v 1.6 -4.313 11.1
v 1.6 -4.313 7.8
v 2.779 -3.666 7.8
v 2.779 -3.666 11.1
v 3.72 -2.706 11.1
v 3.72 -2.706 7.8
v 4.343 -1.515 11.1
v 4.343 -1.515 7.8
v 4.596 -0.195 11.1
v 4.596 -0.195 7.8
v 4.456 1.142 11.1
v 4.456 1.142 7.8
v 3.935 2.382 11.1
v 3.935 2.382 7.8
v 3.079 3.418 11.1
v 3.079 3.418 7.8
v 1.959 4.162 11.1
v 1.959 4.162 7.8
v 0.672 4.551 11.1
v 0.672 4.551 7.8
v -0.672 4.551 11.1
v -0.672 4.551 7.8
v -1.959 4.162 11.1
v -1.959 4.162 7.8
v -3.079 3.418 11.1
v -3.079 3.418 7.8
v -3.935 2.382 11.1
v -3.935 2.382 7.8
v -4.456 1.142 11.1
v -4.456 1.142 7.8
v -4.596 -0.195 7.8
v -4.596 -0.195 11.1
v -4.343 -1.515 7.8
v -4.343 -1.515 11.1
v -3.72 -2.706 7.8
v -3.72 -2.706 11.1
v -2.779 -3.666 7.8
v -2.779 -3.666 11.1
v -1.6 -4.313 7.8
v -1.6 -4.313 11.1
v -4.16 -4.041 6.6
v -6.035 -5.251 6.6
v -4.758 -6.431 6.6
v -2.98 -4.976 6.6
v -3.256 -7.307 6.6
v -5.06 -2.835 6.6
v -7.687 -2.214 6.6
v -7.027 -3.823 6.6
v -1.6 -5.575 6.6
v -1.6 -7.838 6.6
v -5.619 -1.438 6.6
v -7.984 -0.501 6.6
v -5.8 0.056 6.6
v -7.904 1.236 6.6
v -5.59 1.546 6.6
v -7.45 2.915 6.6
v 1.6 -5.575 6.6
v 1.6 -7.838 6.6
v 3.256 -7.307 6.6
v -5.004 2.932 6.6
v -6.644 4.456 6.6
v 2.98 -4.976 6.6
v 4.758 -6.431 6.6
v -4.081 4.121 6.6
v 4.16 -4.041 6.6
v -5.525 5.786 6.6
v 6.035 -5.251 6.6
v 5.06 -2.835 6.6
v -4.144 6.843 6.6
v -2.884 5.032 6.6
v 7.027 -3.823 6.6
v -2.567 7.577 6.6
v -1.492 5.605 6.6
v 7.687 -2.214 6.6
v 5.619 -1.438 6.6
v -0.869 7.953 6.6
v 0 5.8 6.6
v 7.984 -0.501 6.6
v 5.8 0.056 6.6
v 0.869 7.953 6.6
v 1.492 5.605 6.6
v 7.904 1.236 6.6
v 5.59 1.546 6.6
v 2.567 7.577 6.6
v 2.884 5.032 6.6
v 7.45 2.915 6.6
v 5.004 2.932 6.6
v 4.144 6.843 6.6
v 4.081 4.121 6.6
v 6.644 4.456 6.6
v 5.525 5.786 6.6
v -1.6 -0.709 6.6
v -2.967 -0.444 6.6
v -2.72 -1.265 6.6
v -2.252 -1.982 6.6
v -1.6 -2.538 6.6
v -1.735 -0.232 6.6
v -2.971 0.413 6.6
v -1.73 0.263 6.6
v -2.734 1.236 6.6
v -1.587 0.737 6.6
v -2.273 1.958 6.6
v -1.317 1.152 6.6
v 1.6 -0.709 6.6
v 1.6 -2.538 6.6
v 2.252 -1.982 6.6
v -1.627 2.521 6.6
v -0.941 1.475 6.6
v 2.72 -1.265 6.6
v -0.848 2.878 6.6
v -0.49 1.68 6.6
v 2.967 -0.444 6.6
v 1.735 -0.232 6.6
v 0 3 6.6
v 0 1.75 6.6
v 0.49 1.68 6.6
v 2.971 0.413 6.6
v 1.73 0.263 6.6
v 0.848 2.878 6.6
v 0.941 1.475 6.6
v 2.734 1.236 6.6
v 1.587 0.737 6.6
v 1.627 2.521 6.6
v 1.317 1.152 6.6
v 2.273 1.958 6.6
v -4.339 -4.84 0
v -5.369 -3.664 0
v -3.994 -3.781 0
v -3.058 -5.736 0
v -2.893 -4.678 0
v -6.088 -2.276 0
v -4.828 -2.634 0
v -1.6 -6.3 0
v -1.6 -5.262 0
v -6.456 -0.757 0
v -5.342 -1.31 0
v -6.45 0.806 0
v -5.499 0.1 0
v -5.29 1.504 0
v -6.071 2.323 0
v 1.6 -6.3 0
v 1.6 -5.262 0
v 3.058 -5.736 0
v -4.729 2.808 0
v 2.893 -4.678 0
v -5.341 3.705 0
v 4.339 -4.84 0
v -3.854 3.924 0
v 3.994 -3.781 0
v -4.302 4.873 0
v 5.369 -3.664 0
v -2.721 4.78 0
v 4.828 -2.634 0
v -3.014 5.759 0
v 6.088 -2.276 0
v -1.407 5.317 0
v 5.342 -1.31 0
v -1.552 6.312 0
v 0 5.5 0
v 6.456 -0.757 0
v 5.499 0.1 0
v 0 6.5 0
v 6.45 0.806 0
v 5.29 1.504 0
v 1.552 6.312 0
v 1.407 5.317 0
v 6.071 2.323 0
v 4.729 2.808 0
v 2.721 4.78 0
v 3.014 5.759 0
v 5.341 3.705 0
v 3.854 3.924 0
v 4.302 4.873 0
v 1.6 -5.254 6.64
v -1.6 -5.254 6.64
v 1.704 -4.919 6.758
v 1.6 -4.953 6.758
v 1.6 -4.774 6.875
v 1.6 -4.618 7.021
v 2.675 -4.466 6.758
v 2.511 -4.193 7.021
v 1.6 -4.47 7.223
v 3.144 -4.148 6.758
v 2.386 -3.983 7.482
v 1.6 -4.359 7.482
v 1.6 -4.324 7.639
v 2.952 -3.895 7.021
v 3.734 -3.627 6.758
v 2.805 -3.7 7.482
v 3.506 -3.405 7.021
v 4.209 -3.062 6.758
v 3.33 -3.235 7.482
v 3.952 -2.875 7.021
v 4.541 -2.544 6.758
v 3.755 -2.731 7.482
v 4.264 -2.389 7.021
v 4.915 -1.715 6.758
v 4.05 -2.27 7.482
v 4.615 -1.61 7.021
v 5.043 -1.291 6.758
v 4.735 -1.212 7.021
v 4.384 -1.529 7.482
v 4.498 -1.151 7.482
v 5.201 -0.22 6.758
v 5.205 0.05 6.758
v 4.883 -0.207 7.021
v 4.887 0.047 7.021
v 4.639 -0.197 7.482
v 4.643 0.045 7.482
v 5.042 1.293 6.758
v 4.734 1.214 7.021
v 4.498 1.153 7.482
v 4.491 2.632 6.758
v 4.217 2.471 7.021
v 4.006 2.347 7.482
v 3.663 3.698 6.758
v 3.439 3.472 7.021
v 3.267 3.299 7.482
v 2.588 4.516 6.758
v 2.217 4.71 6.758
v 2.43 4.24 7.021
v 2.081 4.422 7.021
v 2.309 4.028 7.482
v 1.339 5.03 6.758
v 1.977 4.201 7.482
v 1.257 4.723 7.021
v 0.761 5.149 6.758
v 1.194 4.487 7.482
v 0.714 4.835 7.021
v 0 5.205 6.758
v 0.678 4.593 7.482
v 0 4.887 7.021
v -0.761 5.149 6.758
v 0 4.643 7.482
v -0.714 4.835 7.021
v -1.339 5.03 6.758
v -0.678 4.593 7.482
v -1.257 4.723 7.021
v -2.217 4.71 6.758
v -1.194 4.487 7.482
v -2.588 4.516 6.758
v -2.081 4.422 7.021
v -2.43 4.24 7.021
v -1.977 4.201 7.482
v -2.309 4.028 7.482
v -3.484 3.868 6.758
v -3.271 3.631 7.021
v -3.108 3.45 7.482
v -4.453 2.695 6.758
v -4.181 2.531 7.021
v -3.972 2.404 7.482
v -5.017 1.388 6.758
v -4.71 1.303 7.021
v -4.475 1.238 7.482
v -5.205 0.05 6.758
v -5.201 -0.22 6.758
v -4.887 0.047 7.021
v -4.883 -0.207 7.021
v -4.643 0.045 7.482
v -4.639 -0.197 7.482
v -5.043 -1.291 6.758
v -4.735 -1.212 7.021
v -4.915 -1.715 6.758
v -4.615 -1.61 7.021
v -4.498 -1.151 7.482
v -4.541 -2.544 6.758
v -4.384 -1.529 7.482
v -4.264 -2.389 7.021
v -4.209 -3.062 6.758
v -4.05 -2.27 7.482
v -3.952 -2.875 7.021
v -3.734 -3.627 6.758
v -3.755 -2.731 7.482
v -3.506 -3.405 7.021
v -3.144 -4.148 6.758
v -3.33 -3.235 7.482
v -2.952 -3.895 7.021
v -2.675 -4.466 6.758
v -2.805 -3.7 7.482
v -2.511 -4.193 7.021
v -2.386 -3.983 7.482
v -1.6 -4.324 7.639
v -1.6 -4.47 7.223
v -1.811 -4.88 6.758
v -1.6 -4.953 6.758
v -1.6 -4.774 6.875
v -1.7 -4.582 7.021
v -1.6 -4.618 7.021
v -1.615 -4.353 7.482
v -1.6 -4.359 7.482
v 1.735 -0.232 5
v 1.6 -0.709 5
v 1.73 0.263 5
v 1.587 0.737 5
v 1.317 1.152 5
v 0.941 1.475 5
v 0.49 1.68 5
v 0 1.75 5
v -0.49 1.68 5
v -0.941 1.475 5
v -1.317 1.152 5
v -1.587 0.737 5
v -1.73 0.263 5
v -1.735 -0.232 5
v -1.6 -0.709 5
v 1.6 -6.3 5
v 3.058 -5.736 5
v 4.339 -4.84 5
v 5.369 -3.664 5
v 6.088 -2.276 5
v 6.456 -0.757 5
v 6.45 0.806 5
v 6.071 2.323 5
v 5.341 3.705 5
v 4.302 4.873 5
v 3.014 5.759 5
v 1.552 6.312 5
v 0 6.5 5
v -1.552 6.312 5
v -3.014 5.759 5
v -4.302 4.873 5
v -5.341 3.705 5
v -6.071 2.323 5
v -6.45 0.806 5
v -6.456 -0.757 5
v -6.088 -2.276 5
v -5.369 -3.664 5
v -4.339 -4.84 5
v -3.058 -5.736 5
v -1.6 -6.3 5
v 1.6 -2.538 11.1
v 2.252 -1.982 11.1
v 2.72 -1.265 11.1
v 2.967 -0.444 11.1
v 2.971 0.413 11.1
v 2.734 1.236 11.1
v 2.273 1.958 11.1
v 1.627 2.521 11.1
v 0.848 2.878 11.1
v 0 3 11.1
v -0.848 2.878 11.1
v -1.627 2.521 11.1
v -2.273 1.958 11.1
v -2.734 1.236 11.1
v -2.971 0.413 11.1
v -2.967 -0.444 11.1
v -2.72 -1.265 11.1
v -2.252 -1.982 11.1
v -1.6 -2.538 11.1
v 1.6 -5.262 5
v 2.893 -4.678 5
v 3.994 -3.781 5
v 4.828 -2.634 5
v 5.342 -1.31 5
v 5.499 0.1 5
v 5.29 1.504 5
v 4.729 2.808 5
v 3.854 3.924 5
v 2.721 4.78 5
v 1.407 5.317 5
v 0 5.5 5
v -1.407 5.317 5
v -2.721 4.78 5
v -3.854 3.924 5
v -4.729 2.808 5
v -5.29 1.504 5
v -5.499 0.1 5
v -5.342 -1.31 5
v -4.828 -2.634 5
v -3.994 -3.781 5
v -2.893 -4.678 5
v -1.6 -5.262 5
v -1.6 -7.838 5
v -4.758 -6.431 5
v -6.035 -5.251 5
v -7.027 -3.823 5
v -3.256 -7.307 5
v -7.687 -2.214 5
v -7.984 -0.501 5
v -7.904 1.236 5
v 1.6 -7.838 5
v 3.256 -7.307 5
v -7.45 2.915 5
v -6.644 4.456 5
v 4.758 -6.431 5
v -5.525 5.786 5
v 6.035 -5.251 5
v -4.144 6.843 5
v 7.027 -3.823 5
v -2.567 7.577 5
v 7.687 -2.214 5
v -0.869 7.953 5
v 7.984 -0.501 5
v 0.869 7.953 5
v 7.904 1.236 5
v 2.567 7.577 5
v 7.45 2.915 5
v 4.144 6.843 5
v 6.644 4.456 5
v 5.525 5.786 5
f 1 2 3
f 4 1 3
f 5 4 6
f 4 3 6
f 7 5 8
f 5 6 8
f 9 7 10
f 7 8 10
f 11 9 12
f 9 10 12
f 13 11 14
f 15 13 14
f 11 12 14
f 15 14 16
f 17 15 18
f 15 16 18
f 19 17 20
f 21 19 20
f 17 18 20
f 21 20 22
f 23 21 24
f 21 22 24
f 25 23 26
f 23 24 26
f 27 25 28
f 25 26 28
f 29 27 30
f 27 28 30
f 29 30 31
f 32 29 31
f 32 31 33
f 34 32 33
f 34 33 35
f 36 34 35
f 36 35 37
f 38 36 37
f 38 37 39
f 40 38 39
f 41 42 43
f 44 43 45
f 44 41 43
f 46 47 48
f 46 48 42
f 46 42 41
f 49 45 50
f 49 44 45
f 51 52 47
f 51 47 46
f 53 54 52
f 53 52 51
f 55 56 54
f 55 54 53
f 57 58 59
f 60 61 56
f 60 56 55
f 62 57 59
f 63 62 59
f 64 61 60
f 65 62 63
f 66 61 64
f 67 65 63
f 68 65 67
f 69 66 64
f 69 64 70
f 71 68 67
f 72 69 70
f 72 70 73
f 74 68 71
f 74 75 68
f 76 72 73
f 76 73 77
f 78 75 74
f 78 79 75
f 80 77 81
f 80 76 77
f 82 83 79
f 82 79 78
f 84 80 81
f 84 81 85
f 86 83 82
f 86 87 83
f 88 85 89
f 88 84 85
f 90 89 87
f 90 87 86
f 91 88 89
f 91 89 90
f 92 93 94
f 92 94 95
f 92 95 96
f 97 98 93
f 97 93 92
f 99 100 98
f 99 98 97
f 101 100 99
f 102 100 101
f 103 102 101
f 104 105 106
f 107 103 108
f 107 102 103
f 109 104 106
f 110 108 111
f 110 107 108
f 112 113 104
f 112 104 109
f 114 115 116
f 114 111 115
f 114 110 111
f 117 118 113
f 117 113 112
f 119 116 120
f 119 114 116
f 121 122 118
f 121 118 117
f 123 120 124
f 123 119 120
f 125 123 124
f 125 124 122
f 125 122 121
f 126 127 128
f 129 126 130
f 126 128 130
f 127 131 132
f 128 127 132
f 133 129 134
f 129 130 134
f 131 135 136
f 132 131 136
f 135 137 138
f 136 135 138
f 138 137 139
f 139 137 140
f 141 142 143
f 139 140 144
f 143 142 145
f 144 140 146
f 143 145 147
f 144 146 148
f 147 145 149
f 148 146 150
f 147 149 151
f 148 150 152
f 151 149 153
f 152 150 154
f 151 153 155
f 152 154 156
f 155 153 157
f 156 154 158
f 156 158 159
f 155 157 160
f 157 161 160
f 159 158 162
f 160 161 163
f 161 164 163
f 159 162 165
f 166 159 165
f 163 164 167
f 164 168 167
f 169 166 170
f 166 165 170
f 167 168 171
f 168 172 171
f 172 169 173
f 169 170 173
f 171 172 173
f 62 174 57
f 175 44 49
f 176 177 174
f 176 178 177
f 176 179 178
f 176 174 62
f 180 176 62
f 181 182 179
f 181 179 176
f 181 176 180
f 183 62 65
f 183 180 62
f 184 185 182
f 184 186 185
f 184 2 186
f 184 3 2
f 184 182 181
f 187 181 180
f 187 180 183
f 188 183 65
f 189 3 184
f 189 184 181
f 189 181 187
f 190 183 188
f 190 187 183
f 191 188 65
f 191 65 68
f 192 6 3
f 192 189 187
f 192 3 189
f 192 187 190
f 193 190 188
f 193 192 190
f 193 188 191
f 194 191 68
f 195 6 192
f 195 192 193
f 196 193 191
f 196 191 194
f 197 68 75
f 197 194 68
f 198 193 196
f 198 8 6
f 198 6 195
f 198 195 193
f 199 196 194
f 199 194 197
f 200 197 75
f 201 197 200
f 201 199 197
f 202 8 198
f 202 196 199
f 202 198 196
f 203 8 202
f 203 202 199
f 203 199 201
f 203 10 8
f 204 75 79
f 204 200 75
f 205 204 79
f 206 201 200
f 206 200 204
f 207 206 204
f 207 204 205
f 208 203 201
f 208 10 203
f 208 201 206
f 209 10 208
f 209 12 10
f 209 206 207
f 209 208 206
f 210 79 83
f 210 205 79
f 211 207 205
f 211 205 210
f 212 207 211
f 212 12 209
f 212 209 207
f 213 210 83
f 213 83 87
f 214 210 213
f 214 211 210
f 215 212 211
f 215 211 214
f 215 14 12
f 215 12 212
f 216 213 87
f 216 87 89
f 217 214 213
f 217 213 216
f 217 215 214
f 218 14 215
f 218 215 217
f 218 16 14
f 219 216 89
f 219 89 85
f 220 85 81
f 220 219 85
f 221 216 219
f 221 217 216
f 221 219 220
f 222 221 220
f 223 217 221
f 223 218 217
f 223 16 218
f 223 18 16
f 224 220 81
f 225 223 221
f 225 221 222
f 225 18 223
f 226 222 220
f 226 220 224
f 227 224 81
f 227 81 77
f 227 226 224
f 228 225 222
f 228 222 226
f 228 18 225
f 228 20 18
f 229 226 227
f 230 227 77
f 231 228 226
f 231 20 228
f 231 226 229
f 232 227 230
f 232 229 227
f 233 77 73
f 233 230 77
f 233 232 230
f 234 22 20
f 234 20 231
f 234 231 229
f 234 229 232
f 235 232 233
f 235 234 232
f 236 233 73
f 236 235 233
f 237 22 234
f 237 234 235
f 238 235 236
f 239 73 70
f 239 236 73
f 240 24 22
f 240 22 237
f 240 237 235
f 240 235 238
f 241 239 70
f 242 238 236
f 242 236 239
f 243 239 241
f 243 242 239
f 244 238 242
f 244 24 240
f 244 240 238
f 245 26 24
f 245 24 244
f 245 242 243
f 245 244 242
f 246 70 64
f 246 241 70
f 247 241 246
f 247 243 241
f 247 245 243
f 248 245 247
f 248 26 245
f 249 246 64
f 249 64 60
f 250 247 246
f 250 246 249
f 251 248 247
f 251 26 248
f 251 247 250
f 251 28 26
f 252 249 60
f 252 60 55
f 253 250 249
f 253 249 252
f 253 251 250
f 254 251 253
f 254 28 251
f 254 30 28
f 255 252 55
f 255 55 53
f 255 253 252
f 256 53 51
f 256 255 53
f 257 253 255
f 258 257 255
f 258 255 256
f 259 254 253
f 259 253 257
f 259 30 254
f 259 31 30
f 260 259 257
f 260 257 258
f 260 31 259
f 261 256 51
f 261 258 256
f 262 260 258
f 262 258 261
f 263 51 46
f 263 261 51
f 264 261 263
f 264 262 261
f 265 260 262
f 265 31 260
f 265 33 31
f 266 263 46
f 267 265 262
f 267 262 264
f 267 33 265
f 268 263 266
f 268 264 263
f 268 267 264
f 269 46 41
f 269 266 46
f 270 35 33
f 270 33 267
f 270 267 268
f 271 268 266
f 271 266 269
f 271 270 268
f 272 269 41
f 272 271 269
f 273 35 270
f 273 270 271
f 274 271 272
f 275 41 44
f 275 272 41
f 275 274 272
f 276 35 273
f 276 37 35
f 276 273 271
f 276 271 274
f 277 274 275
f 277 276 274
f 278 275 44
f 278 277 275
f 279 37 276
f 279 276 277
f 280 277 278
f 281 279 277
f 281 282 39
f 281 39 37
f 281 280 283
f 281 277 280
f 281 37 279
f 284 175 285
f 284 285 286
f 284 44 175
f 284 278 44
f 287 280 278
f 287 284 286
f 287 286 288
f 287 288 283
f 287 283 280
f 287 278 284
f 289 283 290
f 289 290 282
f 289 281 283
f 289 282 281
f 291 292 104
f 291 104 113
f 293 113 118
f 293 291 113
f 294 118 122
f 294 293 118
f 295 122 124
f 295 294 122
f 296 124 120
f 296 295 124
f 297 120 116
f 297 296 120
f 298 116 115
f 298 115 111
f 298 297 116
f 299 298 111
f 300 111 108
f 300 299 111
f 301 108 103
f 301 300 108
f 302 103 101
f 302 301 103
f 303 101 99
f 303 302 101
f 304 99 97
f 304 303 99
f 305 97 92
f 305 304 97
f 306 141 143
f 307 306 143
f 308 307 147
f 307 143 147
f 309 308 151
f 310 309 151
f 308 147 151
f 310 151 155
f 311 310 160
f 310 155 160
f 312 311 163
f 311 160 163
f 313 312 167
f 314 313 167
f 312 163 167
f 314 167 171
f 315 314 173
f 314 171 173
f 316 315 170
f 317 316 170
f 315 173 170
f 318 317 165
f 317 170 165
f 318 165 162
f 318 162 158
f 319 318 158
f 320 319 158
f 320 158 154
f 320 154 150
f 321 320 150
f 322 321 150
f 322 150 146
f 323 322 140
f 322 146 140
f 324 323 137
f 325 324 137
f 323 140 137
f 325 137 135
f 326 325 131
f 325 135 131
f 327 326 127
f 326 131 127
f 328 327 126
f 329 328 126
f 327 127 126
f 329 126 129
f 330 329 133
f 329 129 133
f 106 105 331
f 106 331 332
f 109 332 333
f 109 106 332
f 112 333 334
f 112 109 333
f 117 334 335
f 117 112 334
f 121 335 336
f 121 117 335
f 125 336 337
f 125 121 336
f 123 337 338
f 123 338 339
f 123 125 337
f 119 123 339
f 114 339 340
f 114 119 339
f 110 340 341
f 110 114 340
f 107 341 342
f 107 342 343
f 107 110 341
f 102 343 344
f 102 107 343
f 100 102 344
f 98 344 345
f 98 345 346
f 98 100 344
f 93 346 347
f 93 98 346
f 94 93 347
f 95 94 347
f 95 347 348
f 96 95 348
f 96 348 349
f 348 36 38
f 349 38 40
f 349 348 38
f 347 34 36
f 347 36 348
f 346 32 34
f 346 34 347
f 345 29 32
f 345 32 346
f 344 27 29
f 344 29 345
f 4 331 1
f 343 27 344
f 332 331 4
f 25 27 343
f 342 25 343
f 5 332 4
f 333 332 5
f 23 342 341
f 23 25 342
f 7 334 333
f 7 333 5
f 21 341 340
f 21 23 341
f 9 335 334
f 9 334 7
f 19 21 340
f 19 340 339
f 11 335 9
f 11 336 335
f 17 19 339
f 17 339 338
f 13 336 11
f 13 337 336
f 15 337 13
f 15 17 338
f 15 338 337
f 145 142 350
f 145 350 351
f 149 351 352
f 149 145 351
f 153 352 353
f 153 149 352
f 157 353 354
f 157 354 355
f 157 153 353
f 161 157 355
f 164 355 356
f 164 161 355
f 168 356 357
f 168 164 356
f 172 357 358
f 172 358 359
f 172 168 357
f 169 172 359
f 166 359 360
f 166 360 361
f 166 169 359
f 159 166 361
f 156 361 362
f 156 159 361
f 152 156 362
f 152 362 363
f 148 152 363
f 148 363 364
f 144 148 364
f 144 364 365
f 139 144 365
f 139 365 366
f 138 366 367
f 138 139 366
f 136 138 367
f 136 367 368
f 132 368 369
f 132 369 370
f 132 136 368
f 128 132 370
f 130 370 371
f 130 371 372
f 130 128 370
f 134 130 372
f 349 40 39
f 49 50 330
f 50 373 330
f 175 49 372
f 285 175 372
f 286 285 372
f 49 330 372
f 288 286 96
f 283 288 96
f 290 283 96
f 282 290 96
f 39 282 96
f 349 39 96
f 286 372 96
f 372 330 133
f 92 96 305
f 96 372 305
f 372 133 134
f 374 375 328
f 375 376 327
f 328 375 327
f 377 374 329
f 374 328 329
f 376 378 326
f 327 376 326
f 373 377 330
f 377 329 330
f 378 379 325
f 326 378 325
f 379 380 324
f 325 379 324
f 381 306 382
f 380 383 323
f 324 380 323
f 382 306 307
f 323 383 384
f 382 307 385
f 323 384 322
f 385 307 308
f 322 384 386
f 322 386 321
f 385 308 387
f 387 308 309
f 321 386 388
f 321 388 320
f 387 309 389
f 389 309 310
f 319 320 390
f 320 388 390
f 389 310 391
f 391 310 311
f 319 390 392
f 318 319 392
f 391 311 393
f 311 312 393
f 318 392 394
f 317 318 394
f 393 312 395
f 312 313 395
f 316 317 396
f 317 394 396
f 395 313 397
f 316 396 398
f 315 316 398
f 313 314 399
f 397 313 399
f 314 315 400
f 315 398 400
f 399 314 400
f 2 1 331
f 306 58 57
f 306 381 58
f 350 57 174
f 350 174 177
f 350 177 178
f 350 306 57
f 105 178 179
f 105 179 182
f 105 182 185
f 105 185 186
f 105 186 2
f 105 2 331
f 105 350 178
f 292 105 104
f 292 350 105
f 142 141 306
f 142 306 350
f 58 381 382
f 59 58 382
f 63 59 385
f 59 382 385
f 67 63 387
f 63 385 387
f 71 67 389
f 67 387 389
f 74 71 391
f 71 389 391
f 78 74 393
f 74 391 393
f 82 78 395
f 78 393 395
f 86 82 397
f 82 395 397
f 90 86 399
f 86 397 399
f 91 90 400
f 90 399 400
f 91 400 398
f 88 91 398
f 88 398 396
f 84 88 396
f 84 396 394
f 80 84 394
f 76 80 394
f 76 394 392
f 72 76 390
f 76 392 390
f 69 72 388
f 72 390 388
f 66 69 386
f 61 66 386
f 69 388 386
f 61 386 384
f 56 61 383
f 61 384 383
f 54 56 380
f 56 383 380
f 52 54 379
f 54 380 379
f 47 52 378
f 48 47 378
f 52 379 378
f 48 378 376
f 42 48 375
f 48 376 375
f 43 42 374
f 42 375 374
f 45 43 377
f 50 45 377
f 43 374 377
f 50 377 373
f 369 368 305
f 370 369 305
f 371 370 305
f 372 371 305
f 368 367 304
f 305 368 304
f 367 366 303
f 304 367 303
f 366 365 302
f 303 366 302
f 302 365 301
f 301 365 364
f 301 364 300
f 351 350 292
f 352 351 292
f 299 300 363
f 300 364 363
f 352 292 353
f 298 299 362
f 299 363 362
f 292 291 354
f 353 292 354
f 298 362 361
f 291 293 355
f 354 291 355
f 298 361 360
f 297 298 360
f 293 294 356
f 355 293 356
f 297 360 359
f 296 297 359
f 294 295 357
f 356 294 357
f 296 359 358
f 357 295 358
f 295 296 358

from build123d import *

# Parameters (mm, degrees)
PAD_DEPTH    = 5
PAD001_DEPTH = 1.6
PAD002_DEPTH = 4.5
FILLET_R     = 1.2


with BuildPart() as part:
    # Sketch → Pad (new body)
    with BuildSketch(Plane.XY):
        with BuildLine():
            ThreePointArc((1.6, -6.3), (0, 6.5), (-1.6, -6.3))
            Line((-1.6, -6.3), (-1.6, -5.262129))
            ThreePointArc((1.6, -5.262129), (0, 5.5), (-1.6, -5.262129))
            Line((1.6, -6.3), (1.6, -5.262129))
        make_face()
    extrude(amount=PAD_DEPTH)

    # Sketch001 (on Face6 of Pad) → Pad001 (join)
    with BuildSketch(Plane.XY.offset(5)):
        with BuildLine():
            ThreePointArc((1.6, -7.838367), (0, 8), (-1.6, -7.838367))
            Line((-1.6, -7.838367), (-1.6, -0.708872))
            ThreePointArc((1.6, -0.708872), (0, 1.75), (-1.6, -0.708872))
            Line((1.6, -7.838367), (1.6, -0.708872))
        make_face()
    extrude(amount=PAD001_DEPTH)

    # Sketch002 (on Face5 of Pad001) → Pad002 (join)
    with BuildSketch(Plane.XY.offset(6.6)):
        with BuildLine():
            ThreePointArc((1.6, -4.312772), (0, 4.6), (-1.6, -4.312772))
            Line((-1.6, -2.537716), (-1.6, -4.312772))
            ThreePointArc((1.6, -2.537716), (0, 3), (-1.6, -2.537716))
            Line((1.6, -2.537716), (1.6, -4.312772))
        make_face()
    extrude(amount=PAD002_DEPTH)

    # Fillet
    fillet_edges = [part.edges().sort_by_distance(p)[0] for p in [
        (0, 4.6, 6.6),
    ]]
    fillet(fillet_edges, radius=FILLET_R)


solid = part.part
